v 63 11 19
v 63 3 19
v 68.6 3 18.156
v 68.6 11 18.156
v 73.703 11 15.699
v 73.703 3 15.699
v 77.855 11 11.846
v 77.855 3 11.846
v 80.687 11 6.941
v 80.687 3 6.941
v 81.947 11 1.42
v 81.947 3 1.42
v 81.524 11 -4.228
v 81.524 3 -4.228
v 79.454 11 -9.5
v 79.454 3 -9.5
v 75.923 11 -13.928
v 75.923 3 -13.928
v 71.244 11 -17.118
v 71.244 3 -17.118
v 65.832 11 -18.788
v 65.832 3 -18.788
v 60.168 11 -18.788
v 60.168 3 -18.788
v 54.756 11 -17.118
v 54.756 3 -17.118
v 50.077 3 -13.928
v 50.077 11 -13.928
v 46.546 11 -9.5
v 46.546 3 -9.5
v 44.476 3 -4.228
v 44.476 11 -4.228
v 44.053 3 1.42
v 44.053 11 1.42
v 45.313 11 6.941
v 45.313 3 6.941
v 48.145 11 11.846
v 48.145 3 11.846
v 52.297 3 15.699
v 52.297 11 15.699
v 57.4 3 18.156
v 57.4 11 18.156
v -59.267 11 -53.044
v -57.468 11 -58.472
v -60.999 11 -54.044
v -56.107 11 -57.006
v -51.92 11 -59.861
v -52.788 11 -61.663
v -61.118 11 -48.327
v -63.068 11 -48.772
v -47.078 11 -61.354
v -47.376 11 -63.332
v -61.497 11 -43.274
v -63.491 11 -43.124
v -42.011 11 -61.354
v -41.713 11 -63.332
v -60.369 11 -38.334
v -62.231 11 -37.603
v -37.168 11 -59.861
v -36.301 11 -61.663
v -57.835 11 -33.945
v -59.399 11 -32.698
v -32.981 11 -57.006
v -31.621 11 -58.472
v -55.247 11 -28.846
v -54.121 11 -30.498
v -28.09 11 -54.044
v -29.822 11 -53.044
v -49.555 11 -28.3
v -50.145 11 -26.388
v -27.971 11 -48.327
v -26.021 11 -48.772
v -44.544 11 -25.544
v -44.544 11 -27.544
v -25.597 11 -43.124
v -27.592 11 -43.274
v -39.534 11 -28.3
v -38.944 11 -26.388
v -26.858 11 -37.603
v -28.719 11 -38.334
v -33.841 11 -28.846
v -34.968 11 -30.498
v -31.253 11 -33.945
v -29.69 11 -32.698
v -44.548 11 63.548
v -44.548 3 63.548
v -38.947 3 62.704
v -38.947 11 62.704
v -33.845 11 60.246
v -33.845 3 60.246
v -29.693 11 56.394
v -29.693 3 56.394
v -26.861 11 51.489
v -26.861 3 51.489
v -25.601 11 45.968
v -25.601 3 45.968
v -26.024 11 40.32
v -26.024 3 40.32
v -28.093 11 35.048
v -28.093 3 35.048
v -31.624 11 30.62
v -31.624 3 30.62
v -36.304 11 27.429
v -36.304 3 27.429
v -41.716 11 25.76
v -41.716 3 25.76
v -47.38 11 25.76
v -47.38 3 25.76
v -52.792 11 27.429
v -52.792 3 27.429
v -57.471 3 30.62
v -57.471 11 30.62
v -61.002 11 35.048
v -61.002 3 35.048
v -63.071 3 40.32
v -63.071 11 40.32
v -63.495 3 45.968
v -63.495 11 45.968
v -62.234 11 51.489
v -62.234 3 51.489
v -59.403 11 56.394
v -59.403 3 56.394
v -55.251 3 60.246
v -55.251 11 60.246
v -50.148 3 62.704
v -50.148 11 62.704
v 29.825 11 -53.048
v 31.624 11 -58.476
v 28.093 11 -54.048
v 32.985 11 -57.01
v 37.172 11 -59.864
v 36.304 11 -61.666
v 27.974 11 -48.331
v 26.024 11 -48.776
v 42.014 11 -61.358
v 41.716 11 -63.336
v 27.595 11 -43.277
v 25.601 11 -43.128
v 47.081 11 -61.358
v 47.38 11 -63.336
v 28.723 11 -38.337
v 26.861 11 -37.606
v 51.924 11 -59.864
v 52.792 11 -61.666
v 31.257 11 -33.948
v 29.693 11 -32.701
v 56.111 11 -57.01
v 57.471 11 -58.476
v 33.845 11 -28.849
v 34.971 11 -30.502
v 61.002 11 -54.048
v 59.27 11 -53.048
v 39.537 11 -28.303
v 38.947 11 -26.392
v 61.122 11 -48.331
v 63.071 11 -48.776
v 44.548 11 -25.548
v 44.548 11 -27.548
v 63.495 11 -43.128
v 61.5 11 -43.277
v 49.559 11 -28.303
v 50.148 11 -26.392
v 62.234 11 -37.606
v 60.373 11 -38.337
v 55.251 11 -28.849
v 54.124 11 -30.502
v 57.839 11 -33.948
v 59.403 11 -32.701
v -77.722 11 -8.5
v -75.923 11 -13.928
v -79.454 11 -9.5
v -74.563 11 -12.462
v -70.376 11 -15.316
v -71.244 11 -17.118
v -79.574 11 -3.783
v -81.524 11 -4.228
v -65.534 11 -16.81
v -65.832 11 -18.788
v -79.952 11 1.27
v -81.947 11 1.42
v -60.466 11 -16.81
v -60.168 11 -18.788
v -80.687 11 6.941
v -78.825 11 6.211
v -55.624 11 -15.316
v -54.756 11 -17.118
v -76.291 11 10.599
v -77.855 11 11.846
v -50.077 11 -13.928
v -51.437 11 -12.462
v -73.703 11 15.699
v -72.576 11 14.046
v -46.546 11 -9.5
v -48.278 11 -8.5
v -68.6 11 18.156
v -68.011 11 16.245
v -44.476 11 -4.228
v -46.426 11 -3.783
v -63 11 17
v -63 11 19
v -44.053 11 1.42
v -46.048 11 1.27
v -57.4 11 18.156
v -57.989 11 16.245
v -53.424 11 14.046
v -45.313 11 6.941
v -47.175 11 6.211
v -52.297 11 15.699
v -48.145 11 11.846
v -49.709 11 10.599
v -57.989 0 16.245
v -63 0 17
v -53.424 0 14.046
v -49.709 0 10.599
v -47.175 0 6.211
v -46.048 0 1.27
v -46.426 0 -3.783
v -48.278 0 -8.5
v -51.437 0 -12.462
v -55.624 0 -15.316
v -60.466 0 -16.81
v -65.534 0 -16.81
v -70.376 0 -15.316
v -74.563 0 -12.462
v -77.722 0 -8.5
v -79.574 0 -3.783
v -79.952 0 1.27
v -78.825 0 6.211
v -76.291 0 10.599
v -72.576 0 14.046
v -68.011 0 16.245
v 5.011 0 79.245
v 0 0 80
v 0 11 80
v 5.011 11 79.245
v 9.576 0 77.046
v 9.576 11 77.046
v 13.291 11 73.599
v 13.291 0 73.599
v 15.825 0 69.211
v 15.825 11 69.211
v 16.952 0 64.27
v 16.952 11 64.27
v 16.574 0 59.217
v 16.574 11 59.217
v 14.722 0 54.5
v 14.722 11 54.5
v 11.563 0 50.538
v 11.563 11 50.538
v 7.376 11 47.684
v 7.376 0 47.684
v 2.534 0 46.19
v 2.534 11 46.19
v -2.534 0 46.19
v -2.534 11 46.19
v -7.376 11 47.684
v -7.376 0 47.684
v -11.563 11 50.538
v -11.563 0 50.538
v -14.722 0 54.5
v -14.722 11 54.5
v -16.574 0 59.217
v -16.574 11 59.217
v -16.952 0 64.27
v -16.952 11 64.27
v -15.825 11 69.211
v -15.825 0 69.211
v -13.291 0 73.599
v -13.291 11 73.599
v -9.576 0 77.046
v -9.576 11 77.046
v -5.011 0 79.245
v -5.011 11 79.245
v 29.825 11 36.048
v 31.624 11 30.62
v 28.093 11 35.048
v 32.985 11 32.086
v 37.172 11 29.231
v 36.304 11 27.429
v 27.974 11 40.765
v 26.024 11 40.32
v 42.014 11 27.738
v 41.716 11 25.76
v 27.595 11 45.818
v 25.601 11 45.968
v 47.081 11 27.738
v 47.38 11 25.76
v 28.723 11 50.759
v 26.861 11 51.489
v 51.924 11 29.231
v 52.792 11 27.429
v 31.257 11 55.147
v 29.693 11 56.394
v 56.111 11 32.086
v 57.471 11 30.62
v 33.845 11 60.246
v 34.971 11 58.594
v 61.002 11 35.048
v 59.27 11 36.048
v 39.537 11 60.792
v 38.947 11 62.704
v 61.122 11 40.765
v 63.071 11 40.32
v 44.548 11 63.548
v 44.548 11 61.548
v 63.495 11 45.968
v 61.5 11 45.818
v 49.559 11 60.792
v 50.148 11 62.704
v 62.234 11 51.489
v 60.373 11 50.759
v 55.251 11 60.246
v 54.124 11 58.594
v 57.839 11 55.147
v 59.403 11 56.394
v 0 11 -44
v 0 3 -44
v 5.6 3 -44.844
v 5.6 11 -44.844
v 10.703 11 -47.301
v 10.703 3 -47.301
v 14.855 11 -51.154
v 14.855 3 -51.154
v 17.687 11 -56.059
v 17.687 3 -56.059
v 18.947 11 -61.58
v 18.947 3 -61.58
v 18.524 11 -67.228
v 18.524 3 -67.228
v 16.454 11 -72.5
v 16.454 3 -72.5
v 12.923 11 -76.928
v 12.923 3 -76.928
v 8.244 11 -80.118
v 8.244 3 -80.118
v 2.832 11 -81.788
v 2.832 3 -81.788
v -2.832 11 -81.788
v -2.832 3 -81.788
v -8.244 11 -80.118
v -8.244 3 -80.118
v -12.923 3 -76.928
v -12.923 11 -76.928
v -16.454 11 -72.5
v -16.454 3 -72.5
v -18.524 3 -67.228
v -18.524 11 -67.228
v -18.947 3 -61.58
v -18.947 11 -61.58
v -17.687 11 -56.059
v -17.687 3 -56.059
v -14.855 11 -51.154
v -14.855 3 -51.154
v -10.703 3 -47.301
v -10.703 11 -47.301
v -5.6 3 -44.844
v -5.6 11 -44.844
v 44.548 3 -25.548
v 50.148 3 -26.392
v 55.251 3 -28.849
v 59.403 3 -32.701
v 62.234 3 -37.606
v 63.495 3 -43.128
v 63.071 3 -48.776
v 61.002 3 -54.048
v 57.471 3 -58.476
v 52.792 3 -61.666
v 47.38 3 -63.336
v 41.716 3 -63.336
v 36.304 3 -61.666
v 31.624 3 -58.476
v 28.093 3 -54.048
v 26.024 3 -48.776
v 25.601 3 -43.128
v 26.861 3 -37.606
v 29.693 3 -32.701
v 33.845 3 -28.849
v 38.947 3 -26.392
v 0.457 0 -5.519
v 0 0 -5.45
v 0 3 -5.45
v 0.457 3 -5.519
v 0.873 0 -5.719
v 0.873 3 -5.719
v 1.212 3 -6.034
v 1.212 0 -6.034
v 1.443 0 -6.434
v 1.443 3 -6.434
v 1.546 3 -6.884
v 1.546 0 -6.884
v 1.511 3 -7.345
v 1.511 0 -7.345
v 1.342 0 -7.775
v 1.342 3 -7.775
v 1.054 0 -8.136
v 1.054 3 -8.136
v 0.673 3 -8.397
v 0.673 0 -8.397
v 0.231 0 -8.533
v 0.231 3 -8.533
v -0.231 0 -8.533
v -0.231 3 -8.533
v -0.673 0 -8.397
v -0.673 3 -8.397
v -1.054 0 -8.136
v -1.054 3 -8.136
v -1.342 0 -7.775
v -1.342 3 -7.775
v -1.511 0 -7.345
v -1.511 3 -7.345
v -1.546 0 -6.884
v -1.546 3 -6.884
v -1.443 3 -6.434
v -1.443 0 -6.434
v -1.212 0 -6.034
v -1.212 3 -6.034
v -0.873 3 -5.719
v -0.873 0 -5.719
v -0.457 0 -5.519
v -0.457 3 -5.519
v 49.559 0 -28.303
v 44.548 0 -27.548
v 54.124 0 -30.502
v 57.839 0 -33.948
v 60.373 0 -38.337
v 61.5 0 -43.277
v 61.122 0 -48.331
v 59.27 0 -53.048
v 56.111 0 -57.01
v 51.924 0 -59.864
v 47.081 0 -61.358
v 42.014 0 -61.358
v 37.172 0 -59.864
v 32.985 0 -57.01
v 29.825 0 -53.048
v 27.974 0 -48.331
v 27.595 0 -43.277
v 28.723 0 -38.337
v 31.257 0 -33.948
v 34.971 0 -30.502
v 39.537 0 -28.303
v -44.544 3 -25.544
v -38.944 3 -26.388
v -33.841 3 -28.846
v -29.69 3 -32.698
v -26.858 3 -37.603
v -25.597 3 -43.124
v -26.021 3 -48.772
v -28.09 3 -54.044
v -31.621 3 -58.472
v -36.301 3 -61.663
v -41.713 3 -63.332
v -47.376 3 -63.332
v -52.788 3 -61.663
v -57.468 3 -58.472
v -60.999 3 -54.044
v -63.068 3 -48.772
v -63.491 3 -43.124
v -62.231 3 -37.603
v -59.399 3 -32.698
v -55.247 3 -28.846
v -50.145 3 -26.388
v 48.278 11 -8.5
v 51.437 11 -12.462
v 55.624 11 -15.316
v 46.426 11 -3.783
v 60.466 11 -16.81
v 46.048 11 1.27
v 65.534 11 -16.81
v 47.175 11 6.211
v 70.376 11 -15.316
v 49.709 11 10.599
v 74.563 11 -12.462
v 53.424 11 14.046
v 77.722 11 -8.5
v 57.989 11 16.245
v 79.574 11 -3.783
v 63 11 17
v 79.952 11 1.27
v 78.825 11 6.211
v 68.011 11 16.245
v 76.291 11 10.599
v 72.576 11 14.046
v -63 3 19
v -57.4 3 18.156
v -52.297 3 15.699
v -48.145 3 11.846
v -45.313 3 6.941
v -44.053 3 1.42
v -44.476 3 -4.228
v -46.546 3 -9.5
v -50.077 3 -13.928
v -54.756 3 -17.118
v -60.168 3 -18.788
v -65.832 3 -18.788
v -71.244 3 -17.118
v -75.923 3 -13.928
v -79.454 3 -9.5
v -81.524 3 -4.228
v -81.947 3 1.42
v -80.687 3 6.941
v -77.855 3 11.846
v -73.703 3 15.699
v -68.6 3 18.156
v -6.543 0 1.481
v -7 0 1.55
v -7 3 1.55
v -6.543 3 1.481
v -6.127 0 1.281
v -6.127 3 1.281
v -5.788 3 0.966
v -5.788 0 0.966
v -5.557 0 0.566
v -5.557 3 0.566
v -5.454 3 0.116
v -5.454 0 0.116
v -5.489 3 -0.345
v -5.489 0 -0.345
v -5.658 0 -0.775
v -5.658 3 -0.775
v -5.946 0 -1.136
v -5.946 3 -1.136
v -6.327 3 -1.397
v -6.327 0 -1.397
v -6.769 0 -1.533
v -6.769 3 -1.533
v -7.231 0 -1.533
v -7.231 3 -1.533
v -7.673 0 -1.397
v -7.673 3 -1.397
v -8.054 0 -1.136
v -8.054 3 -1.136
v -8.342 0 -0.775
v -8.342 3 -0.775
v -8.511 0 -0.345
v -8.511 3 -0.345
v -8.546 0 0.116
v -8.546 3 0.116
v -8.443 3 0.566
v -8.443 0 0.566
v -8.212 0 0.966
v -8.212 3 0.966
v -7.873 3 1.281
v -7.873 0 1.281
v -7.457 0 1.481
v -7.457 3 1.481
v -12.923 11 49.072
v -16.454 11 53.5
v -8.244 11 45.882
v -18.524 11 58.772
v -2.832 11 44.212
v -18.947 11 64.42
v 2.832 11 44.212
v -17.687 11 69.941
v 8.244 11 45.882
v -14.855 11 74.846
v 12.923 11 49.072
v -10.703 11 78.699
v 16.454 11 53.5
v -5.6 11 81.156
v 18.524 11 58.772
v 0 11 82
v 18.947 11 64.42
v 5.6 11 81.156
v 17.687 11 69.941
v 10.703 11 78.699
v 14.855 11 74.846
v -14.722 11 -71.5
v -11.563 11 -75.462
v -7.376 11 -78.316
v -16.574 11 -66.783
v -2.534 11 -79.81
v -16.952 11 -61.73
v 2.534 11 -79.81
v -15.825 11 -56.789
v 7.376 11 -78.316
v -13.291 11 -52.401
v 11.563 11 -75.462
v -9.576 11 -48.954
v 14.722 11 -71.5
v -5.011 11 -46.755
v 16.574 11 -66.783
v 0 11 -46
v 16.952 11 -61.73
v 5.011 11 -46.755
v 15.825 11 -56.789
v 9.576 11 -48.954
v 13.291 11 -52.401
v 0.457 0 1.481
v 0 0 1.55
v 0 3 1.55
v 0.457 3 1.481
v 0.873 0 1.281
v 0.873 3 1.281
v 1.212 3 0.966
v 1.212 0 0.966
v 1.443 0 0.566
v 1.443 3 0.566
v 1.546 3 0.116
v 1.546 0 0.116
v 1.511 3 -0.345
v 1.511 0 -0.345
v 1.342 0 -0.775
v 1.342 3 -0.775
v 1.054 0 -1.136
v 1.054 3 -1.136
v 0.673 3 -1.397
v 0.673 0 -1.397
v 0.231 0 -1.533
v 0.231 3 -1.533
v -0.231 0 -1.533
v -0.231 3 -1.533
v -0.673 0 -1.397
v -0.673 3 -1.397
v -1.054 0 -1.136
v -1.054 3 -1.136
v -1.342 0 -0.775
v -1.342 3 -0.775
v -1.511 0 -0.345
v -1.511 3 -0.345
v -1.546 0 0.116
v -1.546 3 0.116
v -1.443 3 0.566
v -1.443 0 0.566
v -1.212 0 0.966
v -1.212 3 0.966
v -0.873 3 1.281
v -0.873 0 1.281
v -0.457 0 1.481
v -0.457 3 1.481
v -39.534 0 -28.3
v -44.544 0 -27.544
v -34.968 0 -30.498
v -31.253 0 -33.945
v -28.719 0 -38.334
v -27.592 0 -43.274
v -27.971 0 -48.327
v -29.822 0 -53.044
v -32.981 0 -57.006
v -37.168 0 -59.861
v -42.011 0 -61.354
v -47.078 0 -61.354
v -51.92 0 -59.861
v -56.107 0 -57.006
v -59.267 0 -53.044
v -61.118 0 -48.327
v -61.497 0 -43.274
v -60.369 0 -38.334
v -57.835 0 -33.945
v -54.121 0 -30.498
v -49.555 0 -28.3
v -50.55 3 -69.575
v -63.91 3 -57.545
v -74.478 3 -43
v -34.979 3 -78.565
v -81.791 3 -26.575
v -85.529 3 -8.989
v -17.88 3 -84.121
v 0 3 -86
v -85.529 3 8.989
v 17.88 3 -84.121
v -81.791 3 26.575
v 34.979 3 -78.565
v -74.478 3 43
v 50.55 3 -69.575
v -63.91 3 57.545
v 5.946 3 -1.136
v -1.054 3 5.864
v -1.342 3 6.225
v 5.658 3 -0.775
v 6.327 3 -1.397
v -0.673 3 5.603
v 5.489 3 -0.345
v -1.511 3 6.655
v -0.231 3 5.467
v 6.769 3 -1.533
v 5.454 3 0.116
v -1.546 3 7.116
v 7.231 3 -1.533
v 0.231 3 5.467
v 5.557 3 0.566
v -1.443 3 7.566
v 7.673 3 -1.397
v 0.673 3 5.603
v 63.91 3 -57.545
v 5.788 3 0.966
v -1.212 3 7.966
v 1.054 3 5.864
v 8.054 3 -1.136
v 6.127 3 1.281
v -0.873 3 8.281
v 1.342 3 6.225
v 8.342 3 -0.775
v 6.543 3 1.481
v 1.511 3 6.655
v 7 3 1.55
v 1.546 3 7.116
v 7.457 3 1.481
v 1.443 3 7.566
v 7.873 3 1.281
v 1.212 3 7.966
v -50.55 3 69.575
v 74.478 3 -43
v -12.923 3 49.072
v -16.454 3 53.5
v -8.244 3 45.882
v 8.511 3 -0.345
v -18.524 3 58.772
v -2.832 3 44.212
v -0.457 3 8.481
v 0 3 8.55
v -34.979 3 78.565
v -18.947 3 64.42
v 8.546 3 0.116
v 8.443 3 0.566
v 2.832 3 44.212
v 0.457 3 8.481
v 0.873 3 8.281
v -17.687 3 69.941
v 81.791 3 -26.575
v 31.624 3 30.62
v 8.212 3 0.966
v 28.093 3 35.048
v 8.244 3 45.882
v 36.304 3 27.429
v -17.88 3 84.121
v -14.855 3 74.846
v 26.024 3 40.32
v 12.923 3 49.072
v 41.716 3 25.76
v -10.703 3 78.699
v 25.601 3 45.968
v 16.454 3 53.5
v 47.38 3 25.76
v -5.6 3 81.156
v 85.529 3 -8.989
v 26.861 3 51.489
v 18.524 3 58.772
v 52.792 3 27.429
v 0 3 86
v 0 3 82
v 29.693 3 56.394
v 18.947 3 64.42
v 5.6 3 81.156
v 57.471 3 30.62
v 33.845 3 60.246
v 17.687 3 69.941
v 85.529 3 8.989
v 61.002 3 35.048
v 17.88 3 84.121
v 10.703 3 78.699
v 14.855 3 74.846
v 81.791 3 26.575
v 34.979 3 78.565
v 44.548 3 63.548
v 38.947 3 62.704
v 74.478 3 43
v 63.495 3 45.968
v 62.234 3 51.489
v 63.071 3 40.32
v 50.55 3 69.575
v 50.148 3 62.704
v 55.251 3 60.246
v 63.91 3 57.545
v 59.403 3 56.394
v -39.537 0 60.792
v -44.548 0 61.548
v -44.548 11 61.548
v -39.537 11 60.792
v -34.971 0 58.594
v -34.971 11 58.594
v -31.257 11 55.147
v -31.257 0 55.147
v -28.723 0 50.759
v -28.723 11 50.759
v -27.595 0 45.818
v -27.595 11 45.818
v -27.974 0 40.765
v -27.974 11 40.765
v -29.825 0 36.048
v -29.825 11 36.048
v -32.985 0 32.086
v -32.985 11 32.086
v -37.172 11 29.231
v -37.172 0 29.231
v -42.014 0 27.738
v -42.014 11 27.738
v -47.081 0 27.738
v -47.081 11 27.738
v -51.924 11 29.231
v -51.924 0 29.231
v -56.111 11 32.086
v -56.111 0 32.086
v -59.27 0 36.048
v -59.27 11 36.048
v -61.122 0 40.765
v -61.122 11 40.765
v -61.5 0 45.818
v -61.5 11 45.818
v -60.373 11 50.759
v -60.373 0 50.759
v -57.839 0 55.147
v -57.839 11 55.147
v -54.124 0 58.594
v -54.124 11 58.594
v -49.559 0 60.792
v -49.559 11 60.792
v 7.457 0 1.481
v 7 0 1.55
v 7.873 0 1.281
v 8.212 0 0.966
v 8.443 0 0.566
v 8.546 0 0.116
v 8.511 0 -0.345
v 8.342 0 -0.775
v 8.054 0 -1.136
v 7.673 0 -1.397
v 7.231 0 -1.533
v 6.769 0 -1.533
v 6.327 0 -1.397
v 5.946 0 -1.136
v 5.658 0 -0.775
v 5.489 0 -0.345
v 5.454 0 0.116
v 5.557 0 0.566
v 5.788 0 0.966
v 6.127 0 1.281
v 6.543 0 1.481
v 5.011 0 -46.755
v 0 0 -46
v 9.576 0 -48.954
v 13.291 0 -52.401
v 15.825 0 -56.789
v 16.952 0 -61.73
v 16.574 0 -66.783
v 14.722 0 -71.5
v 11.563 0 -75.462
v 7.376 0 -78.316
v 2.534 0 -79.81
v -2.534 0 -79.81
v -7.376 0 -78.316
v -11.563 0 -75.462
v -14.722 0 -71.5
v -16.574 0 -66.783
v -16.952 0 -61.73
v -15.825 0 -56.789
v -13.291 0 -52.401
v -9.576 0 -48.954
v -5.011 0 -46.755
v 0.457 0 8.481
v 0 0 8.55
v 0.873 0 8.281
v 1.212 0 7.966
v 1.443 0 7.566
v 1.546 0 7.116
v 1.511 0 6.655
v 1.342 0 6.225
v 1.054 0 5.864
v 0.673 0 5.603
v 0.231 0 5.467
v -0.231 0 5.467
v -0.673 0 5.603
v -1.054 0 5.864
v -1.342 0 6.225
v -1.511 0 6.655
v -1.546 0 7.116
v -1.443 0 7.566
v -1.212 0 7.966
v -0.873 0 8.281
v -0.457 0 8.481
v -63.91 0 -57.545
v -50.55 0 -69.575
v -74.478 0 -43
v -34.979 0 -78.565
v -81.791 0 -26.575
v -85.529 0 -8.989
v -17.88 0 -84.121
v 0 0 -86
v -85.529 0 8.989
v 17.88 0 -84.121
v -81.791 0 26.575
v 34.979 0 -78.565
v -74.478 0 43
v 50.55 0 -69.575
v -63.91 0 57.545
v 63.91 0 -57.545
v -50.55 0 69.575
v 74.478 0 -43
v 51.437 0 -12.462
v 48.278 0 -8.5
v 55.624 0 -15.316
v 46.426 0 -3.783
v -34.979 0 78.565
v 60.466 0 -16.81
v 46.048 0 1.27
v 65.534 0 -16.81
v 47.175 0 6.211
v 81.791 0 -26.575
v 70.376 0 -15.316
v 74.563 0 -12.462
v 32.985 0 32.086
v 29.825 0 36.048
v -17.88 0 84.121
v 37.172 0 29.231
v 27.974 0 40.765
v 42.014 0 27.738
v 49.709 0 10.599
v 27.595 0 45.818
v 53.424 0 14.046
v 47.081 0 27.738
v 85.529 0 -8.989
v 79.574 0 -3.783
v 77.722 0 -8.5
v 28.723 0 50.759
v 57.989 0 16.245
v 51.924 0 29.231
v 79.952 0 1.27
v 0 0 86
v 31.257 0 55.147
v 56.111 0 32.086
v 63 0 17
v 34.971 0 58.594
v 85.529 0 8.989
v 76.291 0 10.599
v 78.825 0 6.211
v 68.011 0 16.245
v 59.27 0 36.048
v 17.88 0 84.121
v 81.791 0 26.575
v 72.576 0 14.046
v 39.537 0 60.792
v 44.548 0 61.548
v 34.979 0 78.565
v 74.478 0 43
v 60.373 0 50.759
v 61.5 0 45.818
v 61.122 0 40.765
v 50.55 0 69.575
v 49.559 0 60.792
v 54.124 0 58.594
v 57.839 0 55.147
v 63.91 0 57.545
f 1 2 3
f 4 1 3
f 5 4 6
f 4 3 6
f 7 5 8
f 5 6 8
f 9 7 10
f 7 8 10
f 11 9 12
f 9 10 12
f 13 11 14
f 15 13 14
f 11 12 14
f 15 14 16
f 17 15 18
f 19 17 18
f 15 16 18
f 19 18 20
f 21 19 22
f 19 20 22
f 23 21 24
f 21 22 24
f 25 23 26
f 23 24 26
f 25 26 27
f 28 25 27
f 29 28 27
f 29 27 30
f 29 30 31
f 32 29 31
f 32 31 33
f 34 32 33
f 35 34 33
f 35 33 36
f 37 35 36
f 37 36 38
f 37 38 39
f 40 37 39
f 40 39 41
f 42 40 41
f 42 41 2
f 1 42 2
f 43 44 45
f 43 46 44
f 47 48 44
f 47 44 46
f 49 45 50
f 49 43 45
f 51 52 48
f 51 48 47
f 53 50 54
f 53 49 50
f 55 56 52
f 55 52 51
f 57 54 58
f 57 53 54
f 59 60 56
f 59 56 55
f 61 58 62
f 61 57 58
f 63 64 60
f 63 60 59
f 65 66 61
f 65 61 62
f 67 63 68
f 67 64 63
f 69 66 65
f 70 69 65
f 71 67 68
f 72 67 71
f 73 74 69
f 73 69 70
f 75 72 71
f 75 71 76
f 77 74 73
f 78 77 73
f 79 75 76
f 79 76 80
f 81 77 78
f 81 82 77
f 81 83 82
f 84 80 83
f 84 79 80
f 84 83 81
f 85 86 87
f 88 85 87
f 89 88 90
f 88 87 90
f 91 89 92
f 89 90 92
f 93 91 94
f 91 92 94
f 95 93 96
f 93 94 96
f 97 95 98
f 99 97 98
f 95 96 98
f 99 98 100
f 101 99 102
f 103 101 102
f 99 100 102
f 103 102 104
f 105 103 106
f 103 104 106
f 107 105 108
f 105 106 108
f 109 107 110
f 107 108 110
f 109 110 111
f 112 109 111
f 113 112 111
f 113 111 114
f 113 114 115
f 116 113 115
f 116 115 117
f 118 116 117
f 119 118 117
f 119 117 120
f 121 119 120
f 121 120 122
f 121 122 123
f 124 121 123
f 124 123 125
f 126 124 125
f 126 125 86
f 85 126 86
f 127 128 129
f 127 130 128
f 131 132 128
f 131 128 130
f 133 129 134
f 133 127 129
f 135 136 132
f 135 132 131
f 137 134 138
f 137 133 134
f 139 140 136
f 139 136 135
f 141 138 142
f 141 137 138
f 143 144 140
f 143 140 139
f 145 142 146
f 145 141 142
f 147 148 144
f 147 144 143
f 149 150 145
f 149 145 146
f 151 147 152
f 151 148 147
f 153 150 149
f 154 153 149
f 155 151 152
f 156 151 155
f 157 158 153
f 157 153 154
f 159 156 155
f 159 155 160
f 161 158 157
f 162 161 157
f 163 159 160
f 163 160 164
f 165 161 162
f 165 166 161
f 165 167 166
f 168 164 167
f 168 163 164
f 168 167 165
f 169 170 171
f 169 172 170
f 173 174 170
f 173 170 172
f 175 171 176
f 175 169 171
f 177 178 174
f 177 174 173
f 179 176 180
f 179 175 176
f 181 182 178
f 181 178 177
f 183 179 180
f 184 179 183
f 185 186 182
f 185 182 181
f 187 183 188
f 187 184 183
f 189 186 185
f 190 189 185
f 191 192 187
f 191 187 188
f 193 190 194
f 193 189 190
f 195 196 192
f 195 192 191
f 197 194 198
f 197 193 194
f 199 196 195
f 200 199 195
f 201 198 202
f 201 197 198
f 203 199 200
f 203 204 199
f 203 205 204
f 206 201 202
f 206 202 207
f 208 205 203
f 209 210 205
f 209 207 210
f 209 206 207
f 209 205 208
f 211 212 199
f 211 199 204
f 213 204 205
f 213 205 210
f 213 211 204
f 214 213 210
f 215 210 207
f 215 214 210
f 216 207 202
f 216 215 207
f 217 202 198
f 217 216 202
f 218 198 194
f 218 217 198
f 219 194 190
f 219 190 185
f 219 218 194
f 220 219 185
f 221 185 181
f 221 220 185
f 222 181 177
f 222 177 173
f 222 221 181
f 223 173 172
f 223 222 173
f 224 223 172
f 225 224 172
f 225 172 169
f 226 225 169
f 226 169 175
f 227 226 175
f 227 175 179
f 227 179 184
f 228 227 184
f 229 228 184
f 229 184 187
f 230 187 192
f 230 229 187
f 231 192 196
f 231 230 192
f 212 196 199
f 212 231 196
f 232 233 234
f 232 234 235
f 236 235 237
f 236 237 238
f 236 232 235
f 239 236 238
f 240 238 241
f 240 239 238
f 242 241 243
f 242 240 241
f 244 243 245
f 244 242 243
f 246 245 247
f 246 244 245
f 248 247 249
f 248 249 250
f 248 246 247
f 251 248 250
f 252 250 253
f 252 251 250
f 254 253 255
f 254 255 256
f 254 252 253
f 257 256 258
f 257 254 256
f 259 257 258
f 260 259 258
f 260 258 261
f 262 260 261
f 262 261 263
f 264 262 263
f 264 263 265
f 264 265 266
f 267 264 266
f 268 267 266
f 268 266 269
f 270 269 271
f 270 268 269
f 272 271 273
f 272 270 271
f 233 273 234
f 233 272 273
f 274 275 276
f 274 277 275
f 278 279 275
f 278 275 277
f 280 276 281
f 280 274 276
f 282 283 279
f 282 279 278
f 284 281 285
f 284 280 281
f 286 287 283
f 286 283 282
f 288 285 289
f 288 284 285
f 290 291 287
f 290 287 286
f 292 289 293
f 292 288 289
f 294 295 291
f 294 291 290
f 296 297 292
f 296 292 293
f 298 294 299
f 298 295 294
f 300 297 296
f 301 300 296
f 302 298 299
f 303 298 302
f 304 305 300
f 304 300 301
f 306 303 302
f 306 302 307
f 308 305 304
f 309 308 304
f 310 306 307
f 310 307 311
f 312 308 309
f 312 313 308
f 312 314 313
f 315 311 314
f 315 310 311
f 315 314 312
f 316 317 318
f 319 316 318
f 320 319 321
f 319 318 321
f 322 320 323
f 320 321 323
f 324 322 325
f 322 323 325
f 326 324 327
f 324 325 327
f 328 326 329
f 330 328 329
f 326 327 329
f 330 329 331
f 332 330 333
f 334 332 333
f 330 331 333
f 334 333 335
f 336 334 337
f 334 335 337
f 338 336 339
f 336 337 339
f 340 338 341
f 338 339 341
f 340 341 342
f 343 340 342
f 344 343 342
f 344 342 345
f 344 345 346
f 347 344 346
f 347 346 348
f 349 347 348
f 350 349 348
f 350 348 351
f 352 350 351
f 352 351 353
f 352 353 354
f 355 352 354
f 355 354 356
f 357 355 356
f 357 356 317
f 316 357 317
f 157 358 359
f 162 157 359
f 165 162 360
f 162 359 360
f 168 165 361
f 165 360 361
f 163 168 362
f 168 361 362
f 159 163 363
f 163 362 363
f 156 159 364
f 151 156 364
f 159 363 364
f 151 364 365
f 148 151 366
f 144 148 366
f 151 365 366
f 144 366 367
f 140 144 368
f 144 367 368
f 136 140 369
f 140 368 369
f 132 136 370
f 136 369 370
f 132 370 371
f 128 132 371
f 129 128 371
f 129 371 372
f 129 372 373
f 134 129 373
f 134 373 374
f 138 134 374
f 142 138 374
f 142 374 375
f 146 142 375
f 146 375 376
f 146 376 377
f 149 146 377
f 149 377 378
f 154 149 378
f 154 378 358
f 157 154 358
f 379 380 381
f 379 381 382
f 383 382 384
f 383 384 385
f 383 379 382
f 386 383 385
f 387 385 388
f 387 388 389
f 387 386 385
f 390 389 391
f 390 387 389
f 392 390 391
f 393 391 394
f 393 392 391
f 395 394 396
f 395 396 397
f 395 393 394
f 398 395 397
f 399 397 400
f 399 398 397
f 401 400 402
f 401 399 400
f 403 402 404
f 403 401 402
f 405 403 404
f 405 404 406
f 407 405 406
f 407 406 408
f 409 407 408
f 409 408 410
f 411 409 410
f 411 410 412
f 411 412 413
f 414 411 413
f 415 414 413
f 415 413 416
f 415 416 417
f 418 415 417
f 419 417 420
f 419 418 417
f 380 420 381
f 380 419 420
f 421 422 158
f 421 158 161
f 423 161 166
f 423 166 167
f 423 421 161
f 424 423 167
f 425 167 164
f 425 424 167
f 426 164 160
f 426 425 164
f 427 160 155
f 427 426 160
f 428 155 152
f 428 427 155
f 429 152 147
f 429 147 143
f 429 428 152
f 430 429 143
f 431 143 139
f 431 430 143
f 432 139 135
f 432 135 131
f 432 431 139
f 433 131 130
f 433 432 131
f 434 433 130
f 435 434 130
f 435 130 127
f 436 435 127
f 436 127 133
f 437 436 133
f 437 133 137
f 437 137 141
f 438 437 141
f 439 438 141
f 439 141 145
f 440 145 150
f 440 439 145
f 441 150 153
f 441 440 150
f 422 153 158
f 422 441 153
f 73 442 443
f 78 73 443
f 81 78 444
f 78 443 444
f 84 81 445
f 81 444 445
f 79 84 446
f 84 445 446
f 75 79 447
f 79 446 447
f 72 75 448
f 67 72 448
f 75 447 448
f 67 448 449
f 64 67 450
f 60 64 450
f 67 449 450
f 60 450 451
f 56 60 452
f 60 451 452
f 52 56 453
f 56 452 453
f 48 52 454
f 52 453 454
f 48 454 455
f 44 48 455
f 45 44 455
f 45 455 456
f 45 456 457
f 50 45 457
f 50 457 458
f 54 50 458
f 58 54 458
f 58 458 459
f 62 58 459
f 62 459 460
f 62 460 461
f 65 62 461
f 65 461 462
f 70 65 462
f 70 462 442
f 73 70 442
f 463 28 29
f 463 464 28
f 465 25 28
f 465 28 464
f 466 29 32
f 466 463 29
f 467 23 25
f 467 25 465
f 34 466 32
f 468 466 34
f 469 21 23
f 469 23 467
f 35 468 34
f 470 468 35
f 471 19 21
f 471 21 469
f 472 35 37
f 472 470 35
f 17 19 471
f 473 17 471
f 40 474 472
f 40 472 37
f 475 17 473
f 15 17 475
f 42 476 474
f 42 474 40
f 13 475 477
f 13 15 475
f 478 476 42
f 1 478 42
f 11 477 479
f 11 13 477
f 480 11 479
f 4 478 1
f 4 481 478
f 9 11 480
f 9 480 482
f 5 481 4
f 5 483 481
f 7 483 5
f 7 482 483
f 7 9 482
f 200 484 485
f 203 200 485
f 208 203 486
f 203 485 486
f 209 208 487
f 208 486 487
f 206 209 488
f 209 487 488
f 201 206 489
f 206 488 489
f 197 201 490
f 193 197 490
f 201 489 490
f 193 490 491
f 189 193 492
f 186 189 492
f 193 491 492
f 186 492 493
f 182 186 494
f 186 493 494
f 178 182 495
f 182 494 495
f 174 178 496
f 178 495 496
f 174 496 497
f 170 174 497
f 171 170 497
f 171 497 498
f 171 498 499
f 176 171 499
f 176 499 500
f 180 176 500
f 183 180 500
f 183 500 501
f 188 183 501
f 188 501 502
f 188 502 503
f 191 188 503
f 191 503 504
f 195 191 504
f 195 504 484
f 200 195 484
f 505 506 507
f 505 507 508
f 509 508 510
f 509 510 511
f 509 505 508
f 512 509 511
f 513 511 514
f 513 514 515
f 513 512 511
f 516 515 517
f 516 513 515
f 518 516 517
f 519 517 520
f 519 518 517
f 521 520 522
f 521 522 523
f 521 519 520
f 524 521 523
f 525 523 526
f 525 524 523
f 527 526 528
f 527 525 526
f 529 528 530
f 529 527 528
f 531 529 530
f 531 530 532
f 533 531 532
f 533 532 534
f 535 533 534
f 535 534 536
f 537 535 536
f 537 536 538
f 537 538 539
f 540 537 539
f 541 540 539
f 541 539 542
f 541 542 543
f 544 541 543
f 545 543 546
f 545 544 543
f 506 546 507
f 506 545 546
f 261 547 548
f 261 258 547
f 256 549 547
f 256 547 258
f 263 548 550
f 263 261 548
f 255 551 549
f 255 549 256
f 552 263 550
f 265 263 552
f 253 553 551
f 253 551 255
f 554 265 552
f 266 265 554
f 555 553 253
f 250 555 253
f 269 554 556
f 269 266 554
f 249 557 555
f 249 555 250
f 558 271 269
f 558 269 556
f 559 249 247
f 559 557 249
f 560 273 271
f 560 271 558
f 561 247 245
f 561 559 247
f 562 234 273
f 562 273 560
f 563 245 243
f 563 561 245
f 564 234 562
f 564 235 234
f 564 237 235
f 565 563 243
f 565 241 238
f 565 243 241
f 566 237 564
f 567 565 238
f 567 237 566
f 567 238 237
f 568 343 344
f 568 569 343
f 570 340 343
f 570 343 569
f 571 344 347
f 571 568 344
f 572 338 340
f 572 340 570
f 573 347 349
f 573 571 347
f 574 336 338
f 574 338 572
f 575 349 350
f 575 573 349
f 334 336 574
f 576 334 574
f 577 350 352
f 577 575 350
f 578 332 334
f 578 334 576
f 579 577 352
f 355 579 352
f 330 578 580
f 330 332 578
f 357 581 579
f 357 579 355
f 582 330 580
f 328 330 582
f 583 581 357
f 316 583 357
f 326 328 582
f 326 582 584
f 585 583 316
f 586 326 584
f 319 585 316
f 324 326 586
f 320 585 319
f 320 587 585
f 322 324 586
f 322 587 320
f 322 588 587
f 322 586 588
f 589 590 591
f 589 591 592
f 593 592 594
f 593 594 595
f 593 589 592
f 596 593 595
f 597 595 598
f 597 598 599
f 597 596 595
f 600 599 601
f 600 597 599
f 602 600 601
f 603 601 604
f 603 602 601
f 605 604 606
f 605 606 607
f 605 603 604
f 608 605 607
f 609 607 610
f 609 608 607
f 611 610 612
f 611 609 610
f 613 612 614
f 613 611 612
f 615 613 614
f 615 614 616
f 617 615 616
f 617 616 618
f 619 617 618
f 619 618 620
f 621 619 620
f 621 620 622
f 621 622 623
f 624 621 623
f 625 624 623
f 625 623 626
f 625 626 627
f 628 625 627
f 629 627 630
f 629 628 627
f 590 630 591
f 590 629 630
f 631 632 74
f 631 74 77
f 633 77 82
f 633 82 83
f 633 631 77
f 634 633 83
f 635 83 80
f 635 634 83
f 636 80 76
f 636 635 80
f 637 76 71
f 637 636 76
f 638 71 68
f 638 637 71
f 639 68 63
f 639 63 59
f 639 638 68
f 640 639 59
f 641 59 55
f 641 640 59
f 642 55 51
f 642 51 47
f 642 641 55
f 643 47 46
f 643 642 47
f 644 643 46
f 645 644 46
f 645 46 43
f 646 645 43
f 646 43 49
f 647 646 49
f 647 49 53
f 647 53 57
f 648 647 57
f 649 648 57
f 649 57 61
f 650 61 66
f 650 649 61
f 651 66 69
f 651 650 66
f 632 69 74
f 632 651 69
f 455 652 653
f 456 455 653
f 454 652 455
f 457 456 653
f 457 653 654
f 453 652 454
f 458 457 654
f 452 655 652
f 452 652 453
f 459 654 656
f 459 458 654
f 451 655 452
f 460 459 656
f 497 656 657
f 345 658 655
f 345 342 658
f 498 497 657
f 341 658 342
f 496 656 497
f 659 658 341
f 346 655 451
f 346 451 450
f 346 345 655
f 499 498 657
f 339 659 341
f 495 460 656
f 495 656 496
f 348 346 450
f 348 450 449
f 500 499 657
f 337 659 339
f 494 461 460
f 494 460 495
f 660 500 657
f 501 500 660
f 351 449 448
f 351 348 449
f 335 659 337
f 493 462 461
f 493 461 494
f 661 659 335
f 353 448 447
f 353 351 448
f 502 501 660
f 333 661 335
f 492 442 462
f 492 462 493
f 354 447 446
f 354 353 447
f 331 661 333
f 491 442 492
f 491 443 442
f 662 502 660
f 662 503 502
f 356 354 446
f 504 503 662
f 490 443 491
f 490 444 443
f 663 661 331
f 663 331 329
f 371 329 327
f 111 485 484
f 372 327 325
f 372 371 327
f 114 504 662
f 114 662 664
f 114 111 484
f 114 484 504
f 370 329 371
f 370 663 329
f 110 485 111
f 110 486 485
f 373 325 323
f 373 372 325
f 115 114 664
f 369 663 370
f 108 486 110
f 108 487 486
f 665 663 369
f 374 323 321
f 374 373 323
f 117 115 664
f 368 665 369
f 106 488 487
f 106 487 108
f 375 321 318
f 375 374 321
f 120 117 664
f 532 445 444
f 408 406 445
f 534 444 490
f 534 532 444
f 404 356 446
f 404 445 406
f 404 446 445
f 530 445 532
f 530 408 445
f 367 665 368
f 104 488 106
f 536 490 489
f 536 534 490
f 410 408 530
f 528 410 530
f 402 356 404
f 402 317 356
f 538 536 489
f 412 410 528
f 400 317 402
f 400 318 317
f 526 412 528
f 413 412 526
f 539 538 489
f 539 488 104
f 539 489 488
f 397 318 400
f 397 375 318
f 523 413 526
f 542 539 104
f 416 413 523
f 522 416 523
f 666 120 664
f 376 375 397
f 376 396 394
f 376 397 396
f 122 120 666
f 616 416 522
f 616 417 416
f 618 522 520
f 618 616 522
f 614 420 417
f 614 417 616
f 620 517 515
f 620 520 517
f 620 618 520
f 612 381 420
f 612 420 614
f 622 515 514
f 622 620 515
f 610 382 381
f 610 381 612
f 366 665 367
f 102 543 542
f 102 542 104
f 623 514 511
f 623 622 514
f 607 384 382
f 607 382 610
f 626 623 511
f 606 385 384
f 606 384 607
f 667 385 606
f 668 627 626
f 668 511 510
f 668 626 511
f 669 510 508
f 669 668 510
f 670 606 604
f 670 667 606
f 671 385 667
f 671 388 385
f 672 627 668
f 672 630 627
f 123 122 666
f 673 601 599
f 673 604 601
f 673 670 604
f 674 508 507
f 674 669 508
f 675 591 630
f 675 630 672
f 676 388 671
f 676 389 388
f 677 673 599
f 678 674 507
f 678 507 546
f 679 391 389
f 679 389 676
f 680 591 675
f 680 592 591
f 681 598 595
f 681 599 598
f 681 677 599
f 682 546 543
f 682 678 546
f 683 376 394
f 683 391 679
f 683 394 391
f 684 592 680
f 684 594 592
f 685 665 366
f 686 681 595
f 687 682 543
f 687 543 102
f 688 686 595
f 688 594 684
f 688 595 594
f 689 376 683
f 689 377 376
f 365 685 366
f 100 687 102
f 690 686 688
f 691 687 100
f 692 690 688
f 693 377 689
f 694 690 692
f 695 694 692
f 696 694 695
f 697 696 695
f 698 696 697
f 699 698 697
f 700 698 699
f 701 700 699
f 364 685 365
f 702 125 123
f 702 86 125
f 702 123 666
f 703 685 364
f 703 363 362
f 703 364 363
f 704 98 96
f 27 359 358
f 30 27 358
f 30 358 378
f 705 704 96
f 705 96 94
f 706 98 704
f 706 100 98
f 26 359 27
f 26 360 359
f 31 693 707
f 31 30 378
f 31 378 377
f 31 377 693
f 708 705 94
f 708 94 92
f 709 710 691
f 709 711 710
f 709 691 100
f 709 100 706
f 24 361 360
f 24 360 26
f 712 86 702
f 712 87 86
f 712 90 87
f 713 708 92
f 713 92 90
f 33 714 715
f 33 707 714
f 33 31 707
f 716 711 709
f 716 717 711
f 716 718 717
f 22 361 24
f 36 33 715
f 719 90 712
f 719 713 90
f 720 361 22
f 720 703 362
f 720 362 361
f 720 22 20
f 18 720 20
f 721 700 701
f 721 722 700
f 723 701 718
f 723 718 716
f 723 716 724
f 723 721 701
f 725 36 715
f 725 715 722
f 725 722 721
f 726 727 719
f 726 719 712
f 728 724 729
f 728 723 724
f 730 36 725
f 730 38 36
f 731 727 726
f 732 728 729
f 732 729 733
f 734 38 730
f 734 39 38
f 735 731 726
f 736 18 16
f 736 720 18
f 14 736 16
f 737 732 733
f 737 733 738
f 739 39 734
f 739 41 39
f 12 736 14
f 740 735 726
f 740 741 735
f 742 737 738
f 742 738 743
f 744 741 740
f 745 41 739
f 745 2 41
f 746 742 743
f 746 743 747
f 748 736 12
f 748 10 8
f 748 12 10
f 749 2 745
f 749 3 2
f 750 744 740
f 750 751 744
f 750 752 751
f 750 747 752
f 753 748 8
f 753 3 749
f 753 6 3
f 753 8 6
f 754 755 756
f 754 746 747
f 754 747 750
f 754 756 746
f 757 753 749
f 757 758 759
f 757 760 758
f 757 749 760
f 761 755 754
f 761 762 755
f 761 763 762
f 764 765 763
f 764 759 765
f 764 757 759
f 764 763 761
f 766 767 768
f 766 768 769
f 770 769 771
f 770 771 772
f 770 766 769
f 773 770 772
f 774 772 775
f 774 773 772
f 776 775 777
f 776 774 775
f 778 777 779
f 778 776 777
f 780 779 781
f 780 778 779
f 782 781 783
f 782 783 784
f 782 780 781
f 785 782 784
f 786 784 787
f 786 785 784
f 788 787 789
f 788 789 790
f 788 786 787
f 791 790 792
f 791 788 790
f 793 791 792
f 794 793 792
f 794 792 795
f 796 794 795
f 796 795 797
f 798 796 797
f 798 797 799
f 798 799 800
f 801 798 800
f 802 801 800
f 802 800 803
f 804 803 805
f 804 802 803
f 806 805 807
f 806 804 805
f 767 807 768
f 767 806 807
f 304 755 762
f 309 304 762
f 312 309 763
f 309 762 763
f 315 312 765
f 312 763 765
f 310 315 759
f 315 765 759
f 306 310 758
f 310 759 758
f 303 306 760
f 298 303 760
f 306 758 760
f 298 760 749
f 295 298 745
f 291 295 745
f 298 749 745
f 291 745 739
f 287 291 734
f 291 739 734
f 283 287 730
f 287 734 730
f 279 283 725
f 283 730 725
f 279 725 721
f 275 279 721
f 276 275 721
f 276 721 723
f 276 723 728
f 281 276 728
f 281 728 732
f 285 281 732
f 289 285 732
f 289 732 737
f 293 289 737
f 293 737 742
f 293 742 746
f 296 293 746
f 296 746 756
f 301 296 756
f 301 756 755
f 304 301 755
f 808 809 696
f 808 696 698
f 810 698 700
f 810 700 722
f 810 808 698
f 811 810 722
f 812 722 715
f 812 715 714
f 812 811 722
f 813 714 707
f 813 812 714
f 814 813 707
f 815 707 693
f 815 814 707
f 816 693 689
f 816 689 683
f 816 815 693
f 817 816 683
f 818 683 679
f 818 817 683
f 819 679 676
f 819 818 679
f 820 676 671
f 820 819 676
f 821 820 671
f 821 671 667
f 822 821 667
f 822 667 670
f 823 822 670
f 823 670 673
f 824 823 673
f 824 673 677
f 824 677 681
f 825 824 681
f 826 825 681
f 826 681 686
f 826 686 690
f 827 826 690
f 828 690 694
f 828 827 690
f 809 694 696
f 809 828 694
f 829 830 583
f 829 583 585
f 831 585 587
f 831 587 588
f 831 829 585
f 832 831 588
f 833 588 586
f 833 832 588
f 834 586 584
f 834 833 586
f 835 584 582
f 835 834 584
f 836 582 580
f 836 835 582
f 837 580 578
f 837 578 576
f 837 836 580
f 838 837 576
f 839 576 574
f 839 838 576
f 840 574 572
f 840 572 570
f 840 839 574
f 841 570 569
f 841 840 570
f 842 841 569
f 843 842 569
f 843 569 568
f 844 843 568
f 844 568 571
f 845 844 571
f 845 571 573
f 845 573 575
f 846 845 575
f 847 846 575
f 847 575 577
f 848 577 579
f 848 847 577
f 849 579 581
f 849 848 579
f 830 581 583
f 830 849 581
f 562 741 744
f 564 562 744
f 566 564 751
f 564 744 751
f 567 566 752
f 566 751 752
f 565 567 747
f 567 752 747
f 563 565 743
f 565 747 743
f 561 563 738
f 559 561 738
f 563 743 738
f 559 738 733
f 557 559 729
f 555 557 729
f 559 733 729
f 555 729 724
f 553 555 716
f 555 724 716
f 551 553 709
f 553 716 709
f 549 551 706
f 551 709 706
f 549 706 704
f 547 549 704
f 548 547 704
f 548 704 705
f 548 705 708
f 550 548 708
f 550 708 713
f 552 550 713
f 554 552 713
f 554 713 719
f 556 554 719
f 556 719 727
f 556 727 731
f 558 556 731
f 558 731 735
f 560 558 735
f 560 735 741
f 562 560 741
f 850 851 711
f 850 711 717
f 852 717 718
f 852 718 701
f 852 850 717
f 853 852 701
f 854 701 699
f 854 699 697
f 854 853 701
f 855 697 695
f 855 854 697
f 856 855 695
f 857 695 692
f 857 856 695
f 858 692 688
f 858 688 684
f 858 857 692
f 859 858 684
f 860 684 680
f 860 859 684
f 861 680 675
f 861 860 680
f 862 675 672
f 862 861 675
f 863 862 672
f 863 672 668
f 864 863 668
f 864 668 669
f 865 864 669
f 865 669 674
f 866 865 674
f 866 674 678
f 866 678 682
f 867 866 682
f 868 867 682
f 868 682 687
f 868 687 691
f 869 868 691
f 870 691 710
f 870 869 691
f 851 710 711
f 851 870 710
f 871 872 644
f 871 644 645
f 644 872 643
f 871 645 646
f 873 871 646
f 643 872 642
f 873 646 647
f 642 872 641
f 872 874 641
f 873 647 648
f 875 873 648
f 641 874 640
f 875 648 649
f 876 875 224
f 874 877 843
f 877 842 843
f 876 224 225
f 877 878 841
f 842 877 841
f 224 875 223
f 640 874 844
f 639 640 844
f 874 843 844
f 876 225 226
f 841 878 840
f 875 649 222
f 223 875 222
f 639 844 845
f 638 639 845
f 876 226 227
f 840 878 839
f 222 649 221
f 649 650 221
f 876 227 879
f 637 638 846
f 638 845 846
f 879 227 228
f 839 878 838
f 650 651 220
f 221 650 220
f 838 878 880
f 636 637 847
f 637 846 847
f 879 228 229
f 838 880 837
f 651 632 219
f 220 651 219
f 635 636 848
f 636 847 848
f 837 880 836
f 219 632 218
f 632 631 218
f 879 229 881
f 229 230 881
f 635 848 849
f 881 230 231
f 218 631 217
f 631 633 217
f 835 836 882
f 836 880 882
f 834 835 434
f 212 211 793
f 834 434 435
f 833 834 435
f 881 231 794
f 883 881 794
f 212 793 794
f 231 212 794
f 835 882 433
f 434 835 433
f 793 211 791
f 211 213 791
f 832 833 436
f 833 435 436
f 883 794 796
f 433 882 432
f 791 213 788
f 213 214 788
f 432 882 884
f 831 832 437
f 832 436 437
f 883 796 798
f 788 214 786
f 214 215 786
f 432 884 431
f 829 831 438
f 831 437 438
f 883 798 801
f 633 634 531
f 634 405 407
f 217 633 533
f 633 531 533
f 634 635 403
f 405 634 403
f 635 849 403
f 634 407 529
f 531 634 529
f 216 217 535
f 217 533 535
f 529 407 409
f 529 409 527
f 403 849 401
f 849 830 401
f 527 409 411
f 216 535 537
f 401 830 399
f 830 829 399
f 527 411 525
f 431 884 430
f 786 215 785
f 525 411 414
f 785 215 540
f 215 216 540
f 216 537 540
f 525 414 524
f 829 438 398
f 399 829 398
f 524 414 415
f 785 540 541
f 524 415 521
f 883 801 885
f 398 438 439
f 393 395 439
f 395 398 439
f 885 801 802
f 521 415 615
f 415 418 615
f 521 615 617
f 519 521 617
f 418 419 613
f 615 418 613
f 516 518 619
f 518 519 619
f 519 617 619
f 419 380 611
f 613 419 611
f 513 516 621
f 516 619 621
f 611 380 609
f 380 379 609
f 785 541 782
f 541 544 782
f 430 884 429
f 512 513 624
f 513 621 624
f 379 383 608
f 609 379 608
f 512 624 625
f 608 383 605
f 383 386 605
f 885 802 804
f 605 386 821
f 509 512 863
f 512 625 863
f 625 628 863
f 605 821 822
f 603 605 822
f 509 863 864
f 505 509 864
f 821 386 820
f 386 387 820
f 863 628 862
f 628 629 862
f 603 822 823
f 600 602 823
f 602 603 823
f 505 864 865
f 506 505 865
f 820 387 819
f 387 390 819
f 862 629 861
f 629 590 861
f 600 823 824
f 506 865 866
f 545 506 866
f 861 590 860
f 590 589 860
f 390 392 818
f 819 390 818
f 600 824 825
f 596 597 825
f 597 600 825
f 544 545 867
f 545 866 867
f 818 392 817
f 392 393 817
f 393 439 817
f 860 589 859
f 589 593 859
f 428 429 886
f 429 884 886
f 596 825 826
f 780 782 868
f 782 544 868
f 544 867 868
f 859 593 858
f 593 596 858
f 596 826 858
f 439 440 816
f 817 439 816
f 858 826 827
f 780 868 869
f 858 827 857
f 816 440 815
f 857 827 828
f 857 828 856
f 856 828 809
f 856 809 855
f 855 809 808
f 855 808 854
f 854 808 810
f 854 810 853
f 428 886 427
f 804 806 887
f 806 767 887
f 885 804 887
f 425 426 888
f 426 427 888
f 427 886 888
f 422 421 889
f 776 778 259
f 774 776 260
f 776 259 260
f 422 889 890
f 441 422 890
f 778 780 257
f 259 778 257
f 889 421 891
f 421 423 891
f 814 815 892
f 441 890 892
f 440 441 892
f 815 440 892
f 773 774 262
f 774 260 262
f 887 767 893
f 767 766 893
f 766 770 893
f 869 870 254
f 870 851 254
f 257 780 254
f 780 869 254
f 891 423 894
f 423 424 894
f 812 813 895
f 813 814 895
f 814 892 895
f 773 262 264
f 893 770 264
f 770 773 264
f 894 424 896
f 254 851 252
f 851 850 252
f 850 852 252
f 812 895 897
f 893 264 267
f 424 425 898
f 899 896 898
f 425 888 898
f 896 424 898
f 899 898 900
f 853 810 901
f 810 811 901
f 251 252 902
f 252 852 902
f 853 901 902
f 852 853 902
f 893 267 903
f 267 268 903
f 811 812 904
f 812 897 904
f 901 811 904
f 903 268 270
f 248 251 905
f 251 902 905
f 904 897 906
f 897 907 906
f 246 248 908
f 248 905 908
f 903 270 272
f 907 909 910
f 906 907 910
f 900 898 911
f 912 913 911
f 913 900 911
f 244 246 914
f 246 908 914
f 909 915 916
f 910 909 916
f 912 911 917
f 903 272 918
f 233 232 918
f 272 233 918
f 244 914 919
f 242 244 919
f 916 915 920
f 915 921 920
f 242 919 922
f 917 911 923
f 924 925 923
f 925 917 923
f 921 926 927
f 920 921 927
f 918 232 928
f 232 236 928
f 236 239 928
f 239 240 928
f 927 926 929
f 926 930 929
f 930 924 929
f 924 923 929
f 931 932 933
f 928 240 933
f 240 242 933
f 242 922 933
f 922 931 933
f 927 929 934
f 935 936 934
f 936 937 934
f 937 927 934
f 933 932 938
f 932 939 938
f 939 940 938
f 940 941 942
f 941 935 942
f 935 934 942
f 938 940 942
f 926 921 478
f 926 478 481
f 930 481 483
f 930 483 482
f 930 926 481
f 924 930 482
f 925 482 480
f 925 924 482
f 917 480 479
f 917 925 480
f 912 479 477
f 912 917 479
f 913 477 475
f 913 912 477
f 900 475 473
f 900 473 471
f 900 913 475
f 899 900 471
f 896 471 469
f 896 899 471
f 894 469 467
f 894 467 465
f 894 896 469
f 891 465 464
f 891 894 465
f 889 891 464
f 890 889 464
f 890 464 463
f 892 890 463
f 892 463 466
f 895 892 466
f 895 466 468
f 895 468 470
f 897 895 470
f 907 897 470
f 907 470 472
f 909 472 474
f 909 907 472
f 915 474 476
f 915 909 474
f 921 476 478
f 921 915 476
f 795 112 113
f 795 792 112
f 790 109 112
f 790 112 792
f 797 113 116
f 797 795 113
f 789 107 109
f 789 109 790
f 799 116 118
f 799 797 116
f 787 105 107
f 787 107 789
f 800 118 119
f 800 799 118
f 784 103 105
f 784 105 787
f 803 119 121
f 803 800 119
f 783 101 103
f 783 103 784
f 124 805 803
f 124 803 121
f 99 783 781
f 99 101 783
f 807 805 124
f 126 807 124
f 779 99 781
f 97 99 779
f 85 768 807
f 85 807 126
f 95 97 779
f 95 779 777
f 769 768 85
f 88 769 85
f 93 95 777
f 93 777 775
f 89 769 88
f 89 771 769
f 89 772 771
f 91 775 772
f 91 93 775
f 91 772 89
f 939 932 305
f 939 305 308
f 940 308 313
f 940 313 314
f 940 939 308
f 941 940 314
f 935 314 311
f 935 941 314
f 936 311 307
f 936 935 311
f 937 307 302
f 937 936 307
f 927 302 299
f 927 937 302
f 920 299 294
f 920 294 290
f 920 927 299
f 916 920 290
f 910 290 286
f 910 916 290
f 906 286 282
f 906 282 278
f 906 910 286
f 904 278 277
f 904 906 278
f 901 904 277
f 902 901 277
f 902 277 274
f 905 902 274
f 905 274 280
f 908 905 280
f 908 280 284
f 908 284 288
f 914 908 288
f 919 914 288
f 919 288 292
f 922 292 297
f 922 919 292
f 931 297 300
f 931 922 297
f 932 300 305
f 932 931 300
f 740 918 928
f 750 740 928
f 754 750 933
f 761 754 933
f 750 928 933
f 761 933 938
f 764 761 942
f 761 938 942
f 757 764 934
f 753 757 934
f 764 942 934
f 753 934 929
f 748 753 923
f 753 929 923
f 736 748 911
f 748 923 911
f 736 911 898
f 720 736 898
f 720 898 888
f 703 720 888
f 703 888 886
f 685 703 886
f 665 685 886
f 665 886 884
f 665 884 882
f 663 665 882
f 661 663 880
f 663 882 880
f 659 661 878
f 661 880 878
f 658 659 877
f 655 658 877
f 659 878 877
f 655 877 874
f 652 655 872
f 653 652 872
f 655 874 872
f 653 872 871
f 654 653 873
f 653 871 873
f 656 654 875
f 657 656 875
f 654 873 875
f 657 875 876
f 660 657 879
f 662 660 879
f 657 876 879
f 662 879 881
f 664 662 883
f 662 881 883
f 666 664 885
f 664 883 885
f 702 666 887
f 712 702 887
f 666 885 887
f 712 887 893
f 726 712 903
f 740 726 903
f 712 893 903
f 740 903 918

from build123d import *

# Parameters (mm, degrees)
SKETCH_1_R        = 19
SKETCH_1_R_2      = 17
EXTRUDE_2_DEPTH   = 11
EXTRUDE_2_2_DEPTH = 11
EXTRUDE_2_3_DEPTH = 11
EXTRUDE_2_4_DEPTH = 11
EXTRUDE_2_5_DEPTH = 11
EXTRUDE_2_6_DEPTH = 11
EXTRUDE_2_7_DEPTH = 11
EXTRUDE_2_8_DEPTH = 11
SKETCH_1_8_R      = 86
SKETCH_1_8_R_2    = 19
SKETCH_1_8_R_3    = 1.55
EXTRUDE_3_DEPTH   = 3


with BuildPart() as part:
    # 草图1 → 凸台-拉伸2 (new body)
    with BuildSketch(Plane(origin=(0, 0, 0), x_dir=(1, 0, 0), z_dir=(0, 1, 0))):
        with Locations((-44.544339366, 44.544339366)):
            Circle(SKETCH_1_R)
        with Locations((-44.544339366, 44.544339366)):
            Circle(SKETCH_1_R_2, mode=Mode.SUBTRACT)
    extrude(amount=EXTRUDE_2_DEPTH)



with BuildPart() as body_2:
    # 草图1 → Extrude 2 2 (new body)
    with BuildSketch(Plane(origin=(0, 0, 0), x_dir=(1, 0, 0), z_dir=(0, 1, 0))):
        with Locations((0, 63)):
            Circle(SKETCH_1_R)
        with Locations((0, 63)):
            Circle(SKETCH_1_R_2, mode=Mode.SUBTRACT)
    extrude(amount=EXTRUDE_2_2_DEPTH)


with BuildPart() as body_3:
    # 草图1 → Extrude 2 3 (new body)
    with BuildSketch(Plane(origin=(0, 0, 0), x_dir=(1, 0, 0), z_dir=(0, 1, 0))):
        with Locations((44.547727215, 44.547727215)):
            Circle(SKETCH_1_R)
        with Locations((44.547727215, 44.547727215)):
            Circle(SKETCH_1_R_2, mode=Mode.SUBTRACT)
    extrude(amount=EXTRUDE_2_3_DEPTH)


with BuildPart() as body_4:
    # 草图1 → Extrude 2 4 (new body)
    with BuildSketch(Plane(origin=(0, 0, 0), x_dir=(1, 0, 0), z_dir=(0, 1, 0))):
        with Locations((63, 0)):
            Circle(SKETCH_1_R)
        with Locations((63, 0)):
            Circle(SKETCH_1_R_2, mode=Mode.SUBTRACT)
    extrude(amount=EXTRUDE_2_4_DEPTH)


with BuildPart() as body_5:
    # 草图1 → Extrude 2 5 (new body)
    with BuildSketch(Plane(origin=(0, 0, 0), x_dir=(1, 0, 0), z_dir=(0, 1, 0))):
        with Locations((44.547727215, -44.547727215)):
            Circle(SKETCH_1_R)
        with Locations((44.547727215, -44.547727215)):
            Circle(SKETCH_1_R_2, mode=Mode.SUBTRACT)
    extrude(amount=EXTRUDE_2_5_DEPTH)


with BuildPart() as body_6:
    # 草图1 → Extrude 2 6 (new body)
    with BuildSketch(Plane(origin=(0, 0, 0), x_dir=(1, 0, 0), z_dir=(0, 1, 0))):
        with Locations((0, -63)):
            Circle(SKETCH_1_R)
        with Locations((0, -63)):
            Circle(SKETCH_1_R_2, mode=Mode.SUBTRACT)
    extrude(amount=EXTRUDE_2_6_DEPTH)


with BuildPart() as body_7:
    # 草图1 → Extrude 2 7 (new body)
    with BuildSketch(Plane(origin=(0, 0, 0), x_dir=(1, 0, 0), z_dir=(0, 1, 0))):
        with Locations((-44.547727215, -44.547727215)):
            Circle(SKETCH_1_R)
        with Locations((-44.547727215, -44.547727215)):
            Circle(SKETCH_1_R_2, mode=Mode.SUBTRACT)
    extrude(amount=EXTRUDE_2_7_DEPTH)


with BuildPart() as body_8:
    # 草图1 → Extrude 2 8 (new body)
    with BuildSketch(Plane(origin=(0, 0, 0), x_dir=(1, 0, 0), z_dir=(0, 1, 0))):
        with Locations((-63, 0)):
            Circle(SKETCH_1_R)
        with Locations((-63, 0)):
            Circle(SKETCH_1_R_2, mode=Mode.SUBTRACT)
    extrude(amount=EXTRUDE_2_8_DEPTH)


with BuildPart() as part_1:
    add(part.part)

    add(body_2.part)  # 凸台-拉伸3 merges body 2

    add(body_3.part)  # 凸台-拉伸3 merges body 3

    add(body_4.part)  # 凸台-拉伸3 merges body 4

    add(body_5.part)  # 凸台-拉伸3 merges body 5

    add(body_6.part)  # 凸台-拉伸3 merges body 6

    add(body_7.part)  # 凸台-拉伸3 merges body 7

    add(body_8.part)  # 凸台-拉伸3 merges body 8
    # 草图1<8> → 凸台-拉伸3 (add)
    with BuildSketch(Plane(origin=(0, 0, 0), x_dir=(1, 0, 0), z_dir=(0, 1, 0))):
        Circle(SKETCH_1_8_R)
        with Locations((-44.547727215, -44.547727215)):
            Circle(SKETCH_1_8_R_2, mode=Mode.SUBTRACT)
        with Locations((0, -63)):
            Circle(SKETCH_1_8_R_2, mode=Mode.SUBTRACT)
        with Locations((44.547727215, -44.547727215)):
            Circle(SKETCH_1_8_R_2, mode=Mode.SUBTRACT)
        with Locations((0, -7)):
            Circle(SKETCH_1_8_R_3, mode=Mode.SUBTRACT)
        with Locations((-63, 0)):
            Circle(SKETCH_1_8_R_2, mode=Mode.SUBTRACT)
        with Locations((-7, 0)):
            Circle(SKETCH_1_8_R_3, mode=Mode.SUBTRACT)
        with Locations((-44.544339366, 44.544339366)):
            Circle(SKETCH_1_8_R_2, mode=Mode.SUBTRACT)
        Circle(SKETCH_1_8_R_3, mode=Mode.SUBTRACT)
        with Locations((7, 0)):
            Circle(SKETCH_1_8_R_3, mode=Mode.SUBTRACT)
        with Locations((0, 7)):
            Circle(SKETCH_1_8_R_3, mode=Mode.SUBTRACT)
        with Locations((63, 0)):
            Circle(SKETCH_1_8_R_2, mode=Mode.SUBTRACT)
        with Locations((0, 63)):
            Circle(SKETCH_1_8_R_2, mode=Mode.SUBTRACT)
        with Locations((44.547727215, 44.547727215)):
            Circle(SKETCH_1_8_R_2, mode=Mode.SUBTRACT)
    extrude(amount=EXTRUDE_3_DEPTH)


solid = part_1.part
